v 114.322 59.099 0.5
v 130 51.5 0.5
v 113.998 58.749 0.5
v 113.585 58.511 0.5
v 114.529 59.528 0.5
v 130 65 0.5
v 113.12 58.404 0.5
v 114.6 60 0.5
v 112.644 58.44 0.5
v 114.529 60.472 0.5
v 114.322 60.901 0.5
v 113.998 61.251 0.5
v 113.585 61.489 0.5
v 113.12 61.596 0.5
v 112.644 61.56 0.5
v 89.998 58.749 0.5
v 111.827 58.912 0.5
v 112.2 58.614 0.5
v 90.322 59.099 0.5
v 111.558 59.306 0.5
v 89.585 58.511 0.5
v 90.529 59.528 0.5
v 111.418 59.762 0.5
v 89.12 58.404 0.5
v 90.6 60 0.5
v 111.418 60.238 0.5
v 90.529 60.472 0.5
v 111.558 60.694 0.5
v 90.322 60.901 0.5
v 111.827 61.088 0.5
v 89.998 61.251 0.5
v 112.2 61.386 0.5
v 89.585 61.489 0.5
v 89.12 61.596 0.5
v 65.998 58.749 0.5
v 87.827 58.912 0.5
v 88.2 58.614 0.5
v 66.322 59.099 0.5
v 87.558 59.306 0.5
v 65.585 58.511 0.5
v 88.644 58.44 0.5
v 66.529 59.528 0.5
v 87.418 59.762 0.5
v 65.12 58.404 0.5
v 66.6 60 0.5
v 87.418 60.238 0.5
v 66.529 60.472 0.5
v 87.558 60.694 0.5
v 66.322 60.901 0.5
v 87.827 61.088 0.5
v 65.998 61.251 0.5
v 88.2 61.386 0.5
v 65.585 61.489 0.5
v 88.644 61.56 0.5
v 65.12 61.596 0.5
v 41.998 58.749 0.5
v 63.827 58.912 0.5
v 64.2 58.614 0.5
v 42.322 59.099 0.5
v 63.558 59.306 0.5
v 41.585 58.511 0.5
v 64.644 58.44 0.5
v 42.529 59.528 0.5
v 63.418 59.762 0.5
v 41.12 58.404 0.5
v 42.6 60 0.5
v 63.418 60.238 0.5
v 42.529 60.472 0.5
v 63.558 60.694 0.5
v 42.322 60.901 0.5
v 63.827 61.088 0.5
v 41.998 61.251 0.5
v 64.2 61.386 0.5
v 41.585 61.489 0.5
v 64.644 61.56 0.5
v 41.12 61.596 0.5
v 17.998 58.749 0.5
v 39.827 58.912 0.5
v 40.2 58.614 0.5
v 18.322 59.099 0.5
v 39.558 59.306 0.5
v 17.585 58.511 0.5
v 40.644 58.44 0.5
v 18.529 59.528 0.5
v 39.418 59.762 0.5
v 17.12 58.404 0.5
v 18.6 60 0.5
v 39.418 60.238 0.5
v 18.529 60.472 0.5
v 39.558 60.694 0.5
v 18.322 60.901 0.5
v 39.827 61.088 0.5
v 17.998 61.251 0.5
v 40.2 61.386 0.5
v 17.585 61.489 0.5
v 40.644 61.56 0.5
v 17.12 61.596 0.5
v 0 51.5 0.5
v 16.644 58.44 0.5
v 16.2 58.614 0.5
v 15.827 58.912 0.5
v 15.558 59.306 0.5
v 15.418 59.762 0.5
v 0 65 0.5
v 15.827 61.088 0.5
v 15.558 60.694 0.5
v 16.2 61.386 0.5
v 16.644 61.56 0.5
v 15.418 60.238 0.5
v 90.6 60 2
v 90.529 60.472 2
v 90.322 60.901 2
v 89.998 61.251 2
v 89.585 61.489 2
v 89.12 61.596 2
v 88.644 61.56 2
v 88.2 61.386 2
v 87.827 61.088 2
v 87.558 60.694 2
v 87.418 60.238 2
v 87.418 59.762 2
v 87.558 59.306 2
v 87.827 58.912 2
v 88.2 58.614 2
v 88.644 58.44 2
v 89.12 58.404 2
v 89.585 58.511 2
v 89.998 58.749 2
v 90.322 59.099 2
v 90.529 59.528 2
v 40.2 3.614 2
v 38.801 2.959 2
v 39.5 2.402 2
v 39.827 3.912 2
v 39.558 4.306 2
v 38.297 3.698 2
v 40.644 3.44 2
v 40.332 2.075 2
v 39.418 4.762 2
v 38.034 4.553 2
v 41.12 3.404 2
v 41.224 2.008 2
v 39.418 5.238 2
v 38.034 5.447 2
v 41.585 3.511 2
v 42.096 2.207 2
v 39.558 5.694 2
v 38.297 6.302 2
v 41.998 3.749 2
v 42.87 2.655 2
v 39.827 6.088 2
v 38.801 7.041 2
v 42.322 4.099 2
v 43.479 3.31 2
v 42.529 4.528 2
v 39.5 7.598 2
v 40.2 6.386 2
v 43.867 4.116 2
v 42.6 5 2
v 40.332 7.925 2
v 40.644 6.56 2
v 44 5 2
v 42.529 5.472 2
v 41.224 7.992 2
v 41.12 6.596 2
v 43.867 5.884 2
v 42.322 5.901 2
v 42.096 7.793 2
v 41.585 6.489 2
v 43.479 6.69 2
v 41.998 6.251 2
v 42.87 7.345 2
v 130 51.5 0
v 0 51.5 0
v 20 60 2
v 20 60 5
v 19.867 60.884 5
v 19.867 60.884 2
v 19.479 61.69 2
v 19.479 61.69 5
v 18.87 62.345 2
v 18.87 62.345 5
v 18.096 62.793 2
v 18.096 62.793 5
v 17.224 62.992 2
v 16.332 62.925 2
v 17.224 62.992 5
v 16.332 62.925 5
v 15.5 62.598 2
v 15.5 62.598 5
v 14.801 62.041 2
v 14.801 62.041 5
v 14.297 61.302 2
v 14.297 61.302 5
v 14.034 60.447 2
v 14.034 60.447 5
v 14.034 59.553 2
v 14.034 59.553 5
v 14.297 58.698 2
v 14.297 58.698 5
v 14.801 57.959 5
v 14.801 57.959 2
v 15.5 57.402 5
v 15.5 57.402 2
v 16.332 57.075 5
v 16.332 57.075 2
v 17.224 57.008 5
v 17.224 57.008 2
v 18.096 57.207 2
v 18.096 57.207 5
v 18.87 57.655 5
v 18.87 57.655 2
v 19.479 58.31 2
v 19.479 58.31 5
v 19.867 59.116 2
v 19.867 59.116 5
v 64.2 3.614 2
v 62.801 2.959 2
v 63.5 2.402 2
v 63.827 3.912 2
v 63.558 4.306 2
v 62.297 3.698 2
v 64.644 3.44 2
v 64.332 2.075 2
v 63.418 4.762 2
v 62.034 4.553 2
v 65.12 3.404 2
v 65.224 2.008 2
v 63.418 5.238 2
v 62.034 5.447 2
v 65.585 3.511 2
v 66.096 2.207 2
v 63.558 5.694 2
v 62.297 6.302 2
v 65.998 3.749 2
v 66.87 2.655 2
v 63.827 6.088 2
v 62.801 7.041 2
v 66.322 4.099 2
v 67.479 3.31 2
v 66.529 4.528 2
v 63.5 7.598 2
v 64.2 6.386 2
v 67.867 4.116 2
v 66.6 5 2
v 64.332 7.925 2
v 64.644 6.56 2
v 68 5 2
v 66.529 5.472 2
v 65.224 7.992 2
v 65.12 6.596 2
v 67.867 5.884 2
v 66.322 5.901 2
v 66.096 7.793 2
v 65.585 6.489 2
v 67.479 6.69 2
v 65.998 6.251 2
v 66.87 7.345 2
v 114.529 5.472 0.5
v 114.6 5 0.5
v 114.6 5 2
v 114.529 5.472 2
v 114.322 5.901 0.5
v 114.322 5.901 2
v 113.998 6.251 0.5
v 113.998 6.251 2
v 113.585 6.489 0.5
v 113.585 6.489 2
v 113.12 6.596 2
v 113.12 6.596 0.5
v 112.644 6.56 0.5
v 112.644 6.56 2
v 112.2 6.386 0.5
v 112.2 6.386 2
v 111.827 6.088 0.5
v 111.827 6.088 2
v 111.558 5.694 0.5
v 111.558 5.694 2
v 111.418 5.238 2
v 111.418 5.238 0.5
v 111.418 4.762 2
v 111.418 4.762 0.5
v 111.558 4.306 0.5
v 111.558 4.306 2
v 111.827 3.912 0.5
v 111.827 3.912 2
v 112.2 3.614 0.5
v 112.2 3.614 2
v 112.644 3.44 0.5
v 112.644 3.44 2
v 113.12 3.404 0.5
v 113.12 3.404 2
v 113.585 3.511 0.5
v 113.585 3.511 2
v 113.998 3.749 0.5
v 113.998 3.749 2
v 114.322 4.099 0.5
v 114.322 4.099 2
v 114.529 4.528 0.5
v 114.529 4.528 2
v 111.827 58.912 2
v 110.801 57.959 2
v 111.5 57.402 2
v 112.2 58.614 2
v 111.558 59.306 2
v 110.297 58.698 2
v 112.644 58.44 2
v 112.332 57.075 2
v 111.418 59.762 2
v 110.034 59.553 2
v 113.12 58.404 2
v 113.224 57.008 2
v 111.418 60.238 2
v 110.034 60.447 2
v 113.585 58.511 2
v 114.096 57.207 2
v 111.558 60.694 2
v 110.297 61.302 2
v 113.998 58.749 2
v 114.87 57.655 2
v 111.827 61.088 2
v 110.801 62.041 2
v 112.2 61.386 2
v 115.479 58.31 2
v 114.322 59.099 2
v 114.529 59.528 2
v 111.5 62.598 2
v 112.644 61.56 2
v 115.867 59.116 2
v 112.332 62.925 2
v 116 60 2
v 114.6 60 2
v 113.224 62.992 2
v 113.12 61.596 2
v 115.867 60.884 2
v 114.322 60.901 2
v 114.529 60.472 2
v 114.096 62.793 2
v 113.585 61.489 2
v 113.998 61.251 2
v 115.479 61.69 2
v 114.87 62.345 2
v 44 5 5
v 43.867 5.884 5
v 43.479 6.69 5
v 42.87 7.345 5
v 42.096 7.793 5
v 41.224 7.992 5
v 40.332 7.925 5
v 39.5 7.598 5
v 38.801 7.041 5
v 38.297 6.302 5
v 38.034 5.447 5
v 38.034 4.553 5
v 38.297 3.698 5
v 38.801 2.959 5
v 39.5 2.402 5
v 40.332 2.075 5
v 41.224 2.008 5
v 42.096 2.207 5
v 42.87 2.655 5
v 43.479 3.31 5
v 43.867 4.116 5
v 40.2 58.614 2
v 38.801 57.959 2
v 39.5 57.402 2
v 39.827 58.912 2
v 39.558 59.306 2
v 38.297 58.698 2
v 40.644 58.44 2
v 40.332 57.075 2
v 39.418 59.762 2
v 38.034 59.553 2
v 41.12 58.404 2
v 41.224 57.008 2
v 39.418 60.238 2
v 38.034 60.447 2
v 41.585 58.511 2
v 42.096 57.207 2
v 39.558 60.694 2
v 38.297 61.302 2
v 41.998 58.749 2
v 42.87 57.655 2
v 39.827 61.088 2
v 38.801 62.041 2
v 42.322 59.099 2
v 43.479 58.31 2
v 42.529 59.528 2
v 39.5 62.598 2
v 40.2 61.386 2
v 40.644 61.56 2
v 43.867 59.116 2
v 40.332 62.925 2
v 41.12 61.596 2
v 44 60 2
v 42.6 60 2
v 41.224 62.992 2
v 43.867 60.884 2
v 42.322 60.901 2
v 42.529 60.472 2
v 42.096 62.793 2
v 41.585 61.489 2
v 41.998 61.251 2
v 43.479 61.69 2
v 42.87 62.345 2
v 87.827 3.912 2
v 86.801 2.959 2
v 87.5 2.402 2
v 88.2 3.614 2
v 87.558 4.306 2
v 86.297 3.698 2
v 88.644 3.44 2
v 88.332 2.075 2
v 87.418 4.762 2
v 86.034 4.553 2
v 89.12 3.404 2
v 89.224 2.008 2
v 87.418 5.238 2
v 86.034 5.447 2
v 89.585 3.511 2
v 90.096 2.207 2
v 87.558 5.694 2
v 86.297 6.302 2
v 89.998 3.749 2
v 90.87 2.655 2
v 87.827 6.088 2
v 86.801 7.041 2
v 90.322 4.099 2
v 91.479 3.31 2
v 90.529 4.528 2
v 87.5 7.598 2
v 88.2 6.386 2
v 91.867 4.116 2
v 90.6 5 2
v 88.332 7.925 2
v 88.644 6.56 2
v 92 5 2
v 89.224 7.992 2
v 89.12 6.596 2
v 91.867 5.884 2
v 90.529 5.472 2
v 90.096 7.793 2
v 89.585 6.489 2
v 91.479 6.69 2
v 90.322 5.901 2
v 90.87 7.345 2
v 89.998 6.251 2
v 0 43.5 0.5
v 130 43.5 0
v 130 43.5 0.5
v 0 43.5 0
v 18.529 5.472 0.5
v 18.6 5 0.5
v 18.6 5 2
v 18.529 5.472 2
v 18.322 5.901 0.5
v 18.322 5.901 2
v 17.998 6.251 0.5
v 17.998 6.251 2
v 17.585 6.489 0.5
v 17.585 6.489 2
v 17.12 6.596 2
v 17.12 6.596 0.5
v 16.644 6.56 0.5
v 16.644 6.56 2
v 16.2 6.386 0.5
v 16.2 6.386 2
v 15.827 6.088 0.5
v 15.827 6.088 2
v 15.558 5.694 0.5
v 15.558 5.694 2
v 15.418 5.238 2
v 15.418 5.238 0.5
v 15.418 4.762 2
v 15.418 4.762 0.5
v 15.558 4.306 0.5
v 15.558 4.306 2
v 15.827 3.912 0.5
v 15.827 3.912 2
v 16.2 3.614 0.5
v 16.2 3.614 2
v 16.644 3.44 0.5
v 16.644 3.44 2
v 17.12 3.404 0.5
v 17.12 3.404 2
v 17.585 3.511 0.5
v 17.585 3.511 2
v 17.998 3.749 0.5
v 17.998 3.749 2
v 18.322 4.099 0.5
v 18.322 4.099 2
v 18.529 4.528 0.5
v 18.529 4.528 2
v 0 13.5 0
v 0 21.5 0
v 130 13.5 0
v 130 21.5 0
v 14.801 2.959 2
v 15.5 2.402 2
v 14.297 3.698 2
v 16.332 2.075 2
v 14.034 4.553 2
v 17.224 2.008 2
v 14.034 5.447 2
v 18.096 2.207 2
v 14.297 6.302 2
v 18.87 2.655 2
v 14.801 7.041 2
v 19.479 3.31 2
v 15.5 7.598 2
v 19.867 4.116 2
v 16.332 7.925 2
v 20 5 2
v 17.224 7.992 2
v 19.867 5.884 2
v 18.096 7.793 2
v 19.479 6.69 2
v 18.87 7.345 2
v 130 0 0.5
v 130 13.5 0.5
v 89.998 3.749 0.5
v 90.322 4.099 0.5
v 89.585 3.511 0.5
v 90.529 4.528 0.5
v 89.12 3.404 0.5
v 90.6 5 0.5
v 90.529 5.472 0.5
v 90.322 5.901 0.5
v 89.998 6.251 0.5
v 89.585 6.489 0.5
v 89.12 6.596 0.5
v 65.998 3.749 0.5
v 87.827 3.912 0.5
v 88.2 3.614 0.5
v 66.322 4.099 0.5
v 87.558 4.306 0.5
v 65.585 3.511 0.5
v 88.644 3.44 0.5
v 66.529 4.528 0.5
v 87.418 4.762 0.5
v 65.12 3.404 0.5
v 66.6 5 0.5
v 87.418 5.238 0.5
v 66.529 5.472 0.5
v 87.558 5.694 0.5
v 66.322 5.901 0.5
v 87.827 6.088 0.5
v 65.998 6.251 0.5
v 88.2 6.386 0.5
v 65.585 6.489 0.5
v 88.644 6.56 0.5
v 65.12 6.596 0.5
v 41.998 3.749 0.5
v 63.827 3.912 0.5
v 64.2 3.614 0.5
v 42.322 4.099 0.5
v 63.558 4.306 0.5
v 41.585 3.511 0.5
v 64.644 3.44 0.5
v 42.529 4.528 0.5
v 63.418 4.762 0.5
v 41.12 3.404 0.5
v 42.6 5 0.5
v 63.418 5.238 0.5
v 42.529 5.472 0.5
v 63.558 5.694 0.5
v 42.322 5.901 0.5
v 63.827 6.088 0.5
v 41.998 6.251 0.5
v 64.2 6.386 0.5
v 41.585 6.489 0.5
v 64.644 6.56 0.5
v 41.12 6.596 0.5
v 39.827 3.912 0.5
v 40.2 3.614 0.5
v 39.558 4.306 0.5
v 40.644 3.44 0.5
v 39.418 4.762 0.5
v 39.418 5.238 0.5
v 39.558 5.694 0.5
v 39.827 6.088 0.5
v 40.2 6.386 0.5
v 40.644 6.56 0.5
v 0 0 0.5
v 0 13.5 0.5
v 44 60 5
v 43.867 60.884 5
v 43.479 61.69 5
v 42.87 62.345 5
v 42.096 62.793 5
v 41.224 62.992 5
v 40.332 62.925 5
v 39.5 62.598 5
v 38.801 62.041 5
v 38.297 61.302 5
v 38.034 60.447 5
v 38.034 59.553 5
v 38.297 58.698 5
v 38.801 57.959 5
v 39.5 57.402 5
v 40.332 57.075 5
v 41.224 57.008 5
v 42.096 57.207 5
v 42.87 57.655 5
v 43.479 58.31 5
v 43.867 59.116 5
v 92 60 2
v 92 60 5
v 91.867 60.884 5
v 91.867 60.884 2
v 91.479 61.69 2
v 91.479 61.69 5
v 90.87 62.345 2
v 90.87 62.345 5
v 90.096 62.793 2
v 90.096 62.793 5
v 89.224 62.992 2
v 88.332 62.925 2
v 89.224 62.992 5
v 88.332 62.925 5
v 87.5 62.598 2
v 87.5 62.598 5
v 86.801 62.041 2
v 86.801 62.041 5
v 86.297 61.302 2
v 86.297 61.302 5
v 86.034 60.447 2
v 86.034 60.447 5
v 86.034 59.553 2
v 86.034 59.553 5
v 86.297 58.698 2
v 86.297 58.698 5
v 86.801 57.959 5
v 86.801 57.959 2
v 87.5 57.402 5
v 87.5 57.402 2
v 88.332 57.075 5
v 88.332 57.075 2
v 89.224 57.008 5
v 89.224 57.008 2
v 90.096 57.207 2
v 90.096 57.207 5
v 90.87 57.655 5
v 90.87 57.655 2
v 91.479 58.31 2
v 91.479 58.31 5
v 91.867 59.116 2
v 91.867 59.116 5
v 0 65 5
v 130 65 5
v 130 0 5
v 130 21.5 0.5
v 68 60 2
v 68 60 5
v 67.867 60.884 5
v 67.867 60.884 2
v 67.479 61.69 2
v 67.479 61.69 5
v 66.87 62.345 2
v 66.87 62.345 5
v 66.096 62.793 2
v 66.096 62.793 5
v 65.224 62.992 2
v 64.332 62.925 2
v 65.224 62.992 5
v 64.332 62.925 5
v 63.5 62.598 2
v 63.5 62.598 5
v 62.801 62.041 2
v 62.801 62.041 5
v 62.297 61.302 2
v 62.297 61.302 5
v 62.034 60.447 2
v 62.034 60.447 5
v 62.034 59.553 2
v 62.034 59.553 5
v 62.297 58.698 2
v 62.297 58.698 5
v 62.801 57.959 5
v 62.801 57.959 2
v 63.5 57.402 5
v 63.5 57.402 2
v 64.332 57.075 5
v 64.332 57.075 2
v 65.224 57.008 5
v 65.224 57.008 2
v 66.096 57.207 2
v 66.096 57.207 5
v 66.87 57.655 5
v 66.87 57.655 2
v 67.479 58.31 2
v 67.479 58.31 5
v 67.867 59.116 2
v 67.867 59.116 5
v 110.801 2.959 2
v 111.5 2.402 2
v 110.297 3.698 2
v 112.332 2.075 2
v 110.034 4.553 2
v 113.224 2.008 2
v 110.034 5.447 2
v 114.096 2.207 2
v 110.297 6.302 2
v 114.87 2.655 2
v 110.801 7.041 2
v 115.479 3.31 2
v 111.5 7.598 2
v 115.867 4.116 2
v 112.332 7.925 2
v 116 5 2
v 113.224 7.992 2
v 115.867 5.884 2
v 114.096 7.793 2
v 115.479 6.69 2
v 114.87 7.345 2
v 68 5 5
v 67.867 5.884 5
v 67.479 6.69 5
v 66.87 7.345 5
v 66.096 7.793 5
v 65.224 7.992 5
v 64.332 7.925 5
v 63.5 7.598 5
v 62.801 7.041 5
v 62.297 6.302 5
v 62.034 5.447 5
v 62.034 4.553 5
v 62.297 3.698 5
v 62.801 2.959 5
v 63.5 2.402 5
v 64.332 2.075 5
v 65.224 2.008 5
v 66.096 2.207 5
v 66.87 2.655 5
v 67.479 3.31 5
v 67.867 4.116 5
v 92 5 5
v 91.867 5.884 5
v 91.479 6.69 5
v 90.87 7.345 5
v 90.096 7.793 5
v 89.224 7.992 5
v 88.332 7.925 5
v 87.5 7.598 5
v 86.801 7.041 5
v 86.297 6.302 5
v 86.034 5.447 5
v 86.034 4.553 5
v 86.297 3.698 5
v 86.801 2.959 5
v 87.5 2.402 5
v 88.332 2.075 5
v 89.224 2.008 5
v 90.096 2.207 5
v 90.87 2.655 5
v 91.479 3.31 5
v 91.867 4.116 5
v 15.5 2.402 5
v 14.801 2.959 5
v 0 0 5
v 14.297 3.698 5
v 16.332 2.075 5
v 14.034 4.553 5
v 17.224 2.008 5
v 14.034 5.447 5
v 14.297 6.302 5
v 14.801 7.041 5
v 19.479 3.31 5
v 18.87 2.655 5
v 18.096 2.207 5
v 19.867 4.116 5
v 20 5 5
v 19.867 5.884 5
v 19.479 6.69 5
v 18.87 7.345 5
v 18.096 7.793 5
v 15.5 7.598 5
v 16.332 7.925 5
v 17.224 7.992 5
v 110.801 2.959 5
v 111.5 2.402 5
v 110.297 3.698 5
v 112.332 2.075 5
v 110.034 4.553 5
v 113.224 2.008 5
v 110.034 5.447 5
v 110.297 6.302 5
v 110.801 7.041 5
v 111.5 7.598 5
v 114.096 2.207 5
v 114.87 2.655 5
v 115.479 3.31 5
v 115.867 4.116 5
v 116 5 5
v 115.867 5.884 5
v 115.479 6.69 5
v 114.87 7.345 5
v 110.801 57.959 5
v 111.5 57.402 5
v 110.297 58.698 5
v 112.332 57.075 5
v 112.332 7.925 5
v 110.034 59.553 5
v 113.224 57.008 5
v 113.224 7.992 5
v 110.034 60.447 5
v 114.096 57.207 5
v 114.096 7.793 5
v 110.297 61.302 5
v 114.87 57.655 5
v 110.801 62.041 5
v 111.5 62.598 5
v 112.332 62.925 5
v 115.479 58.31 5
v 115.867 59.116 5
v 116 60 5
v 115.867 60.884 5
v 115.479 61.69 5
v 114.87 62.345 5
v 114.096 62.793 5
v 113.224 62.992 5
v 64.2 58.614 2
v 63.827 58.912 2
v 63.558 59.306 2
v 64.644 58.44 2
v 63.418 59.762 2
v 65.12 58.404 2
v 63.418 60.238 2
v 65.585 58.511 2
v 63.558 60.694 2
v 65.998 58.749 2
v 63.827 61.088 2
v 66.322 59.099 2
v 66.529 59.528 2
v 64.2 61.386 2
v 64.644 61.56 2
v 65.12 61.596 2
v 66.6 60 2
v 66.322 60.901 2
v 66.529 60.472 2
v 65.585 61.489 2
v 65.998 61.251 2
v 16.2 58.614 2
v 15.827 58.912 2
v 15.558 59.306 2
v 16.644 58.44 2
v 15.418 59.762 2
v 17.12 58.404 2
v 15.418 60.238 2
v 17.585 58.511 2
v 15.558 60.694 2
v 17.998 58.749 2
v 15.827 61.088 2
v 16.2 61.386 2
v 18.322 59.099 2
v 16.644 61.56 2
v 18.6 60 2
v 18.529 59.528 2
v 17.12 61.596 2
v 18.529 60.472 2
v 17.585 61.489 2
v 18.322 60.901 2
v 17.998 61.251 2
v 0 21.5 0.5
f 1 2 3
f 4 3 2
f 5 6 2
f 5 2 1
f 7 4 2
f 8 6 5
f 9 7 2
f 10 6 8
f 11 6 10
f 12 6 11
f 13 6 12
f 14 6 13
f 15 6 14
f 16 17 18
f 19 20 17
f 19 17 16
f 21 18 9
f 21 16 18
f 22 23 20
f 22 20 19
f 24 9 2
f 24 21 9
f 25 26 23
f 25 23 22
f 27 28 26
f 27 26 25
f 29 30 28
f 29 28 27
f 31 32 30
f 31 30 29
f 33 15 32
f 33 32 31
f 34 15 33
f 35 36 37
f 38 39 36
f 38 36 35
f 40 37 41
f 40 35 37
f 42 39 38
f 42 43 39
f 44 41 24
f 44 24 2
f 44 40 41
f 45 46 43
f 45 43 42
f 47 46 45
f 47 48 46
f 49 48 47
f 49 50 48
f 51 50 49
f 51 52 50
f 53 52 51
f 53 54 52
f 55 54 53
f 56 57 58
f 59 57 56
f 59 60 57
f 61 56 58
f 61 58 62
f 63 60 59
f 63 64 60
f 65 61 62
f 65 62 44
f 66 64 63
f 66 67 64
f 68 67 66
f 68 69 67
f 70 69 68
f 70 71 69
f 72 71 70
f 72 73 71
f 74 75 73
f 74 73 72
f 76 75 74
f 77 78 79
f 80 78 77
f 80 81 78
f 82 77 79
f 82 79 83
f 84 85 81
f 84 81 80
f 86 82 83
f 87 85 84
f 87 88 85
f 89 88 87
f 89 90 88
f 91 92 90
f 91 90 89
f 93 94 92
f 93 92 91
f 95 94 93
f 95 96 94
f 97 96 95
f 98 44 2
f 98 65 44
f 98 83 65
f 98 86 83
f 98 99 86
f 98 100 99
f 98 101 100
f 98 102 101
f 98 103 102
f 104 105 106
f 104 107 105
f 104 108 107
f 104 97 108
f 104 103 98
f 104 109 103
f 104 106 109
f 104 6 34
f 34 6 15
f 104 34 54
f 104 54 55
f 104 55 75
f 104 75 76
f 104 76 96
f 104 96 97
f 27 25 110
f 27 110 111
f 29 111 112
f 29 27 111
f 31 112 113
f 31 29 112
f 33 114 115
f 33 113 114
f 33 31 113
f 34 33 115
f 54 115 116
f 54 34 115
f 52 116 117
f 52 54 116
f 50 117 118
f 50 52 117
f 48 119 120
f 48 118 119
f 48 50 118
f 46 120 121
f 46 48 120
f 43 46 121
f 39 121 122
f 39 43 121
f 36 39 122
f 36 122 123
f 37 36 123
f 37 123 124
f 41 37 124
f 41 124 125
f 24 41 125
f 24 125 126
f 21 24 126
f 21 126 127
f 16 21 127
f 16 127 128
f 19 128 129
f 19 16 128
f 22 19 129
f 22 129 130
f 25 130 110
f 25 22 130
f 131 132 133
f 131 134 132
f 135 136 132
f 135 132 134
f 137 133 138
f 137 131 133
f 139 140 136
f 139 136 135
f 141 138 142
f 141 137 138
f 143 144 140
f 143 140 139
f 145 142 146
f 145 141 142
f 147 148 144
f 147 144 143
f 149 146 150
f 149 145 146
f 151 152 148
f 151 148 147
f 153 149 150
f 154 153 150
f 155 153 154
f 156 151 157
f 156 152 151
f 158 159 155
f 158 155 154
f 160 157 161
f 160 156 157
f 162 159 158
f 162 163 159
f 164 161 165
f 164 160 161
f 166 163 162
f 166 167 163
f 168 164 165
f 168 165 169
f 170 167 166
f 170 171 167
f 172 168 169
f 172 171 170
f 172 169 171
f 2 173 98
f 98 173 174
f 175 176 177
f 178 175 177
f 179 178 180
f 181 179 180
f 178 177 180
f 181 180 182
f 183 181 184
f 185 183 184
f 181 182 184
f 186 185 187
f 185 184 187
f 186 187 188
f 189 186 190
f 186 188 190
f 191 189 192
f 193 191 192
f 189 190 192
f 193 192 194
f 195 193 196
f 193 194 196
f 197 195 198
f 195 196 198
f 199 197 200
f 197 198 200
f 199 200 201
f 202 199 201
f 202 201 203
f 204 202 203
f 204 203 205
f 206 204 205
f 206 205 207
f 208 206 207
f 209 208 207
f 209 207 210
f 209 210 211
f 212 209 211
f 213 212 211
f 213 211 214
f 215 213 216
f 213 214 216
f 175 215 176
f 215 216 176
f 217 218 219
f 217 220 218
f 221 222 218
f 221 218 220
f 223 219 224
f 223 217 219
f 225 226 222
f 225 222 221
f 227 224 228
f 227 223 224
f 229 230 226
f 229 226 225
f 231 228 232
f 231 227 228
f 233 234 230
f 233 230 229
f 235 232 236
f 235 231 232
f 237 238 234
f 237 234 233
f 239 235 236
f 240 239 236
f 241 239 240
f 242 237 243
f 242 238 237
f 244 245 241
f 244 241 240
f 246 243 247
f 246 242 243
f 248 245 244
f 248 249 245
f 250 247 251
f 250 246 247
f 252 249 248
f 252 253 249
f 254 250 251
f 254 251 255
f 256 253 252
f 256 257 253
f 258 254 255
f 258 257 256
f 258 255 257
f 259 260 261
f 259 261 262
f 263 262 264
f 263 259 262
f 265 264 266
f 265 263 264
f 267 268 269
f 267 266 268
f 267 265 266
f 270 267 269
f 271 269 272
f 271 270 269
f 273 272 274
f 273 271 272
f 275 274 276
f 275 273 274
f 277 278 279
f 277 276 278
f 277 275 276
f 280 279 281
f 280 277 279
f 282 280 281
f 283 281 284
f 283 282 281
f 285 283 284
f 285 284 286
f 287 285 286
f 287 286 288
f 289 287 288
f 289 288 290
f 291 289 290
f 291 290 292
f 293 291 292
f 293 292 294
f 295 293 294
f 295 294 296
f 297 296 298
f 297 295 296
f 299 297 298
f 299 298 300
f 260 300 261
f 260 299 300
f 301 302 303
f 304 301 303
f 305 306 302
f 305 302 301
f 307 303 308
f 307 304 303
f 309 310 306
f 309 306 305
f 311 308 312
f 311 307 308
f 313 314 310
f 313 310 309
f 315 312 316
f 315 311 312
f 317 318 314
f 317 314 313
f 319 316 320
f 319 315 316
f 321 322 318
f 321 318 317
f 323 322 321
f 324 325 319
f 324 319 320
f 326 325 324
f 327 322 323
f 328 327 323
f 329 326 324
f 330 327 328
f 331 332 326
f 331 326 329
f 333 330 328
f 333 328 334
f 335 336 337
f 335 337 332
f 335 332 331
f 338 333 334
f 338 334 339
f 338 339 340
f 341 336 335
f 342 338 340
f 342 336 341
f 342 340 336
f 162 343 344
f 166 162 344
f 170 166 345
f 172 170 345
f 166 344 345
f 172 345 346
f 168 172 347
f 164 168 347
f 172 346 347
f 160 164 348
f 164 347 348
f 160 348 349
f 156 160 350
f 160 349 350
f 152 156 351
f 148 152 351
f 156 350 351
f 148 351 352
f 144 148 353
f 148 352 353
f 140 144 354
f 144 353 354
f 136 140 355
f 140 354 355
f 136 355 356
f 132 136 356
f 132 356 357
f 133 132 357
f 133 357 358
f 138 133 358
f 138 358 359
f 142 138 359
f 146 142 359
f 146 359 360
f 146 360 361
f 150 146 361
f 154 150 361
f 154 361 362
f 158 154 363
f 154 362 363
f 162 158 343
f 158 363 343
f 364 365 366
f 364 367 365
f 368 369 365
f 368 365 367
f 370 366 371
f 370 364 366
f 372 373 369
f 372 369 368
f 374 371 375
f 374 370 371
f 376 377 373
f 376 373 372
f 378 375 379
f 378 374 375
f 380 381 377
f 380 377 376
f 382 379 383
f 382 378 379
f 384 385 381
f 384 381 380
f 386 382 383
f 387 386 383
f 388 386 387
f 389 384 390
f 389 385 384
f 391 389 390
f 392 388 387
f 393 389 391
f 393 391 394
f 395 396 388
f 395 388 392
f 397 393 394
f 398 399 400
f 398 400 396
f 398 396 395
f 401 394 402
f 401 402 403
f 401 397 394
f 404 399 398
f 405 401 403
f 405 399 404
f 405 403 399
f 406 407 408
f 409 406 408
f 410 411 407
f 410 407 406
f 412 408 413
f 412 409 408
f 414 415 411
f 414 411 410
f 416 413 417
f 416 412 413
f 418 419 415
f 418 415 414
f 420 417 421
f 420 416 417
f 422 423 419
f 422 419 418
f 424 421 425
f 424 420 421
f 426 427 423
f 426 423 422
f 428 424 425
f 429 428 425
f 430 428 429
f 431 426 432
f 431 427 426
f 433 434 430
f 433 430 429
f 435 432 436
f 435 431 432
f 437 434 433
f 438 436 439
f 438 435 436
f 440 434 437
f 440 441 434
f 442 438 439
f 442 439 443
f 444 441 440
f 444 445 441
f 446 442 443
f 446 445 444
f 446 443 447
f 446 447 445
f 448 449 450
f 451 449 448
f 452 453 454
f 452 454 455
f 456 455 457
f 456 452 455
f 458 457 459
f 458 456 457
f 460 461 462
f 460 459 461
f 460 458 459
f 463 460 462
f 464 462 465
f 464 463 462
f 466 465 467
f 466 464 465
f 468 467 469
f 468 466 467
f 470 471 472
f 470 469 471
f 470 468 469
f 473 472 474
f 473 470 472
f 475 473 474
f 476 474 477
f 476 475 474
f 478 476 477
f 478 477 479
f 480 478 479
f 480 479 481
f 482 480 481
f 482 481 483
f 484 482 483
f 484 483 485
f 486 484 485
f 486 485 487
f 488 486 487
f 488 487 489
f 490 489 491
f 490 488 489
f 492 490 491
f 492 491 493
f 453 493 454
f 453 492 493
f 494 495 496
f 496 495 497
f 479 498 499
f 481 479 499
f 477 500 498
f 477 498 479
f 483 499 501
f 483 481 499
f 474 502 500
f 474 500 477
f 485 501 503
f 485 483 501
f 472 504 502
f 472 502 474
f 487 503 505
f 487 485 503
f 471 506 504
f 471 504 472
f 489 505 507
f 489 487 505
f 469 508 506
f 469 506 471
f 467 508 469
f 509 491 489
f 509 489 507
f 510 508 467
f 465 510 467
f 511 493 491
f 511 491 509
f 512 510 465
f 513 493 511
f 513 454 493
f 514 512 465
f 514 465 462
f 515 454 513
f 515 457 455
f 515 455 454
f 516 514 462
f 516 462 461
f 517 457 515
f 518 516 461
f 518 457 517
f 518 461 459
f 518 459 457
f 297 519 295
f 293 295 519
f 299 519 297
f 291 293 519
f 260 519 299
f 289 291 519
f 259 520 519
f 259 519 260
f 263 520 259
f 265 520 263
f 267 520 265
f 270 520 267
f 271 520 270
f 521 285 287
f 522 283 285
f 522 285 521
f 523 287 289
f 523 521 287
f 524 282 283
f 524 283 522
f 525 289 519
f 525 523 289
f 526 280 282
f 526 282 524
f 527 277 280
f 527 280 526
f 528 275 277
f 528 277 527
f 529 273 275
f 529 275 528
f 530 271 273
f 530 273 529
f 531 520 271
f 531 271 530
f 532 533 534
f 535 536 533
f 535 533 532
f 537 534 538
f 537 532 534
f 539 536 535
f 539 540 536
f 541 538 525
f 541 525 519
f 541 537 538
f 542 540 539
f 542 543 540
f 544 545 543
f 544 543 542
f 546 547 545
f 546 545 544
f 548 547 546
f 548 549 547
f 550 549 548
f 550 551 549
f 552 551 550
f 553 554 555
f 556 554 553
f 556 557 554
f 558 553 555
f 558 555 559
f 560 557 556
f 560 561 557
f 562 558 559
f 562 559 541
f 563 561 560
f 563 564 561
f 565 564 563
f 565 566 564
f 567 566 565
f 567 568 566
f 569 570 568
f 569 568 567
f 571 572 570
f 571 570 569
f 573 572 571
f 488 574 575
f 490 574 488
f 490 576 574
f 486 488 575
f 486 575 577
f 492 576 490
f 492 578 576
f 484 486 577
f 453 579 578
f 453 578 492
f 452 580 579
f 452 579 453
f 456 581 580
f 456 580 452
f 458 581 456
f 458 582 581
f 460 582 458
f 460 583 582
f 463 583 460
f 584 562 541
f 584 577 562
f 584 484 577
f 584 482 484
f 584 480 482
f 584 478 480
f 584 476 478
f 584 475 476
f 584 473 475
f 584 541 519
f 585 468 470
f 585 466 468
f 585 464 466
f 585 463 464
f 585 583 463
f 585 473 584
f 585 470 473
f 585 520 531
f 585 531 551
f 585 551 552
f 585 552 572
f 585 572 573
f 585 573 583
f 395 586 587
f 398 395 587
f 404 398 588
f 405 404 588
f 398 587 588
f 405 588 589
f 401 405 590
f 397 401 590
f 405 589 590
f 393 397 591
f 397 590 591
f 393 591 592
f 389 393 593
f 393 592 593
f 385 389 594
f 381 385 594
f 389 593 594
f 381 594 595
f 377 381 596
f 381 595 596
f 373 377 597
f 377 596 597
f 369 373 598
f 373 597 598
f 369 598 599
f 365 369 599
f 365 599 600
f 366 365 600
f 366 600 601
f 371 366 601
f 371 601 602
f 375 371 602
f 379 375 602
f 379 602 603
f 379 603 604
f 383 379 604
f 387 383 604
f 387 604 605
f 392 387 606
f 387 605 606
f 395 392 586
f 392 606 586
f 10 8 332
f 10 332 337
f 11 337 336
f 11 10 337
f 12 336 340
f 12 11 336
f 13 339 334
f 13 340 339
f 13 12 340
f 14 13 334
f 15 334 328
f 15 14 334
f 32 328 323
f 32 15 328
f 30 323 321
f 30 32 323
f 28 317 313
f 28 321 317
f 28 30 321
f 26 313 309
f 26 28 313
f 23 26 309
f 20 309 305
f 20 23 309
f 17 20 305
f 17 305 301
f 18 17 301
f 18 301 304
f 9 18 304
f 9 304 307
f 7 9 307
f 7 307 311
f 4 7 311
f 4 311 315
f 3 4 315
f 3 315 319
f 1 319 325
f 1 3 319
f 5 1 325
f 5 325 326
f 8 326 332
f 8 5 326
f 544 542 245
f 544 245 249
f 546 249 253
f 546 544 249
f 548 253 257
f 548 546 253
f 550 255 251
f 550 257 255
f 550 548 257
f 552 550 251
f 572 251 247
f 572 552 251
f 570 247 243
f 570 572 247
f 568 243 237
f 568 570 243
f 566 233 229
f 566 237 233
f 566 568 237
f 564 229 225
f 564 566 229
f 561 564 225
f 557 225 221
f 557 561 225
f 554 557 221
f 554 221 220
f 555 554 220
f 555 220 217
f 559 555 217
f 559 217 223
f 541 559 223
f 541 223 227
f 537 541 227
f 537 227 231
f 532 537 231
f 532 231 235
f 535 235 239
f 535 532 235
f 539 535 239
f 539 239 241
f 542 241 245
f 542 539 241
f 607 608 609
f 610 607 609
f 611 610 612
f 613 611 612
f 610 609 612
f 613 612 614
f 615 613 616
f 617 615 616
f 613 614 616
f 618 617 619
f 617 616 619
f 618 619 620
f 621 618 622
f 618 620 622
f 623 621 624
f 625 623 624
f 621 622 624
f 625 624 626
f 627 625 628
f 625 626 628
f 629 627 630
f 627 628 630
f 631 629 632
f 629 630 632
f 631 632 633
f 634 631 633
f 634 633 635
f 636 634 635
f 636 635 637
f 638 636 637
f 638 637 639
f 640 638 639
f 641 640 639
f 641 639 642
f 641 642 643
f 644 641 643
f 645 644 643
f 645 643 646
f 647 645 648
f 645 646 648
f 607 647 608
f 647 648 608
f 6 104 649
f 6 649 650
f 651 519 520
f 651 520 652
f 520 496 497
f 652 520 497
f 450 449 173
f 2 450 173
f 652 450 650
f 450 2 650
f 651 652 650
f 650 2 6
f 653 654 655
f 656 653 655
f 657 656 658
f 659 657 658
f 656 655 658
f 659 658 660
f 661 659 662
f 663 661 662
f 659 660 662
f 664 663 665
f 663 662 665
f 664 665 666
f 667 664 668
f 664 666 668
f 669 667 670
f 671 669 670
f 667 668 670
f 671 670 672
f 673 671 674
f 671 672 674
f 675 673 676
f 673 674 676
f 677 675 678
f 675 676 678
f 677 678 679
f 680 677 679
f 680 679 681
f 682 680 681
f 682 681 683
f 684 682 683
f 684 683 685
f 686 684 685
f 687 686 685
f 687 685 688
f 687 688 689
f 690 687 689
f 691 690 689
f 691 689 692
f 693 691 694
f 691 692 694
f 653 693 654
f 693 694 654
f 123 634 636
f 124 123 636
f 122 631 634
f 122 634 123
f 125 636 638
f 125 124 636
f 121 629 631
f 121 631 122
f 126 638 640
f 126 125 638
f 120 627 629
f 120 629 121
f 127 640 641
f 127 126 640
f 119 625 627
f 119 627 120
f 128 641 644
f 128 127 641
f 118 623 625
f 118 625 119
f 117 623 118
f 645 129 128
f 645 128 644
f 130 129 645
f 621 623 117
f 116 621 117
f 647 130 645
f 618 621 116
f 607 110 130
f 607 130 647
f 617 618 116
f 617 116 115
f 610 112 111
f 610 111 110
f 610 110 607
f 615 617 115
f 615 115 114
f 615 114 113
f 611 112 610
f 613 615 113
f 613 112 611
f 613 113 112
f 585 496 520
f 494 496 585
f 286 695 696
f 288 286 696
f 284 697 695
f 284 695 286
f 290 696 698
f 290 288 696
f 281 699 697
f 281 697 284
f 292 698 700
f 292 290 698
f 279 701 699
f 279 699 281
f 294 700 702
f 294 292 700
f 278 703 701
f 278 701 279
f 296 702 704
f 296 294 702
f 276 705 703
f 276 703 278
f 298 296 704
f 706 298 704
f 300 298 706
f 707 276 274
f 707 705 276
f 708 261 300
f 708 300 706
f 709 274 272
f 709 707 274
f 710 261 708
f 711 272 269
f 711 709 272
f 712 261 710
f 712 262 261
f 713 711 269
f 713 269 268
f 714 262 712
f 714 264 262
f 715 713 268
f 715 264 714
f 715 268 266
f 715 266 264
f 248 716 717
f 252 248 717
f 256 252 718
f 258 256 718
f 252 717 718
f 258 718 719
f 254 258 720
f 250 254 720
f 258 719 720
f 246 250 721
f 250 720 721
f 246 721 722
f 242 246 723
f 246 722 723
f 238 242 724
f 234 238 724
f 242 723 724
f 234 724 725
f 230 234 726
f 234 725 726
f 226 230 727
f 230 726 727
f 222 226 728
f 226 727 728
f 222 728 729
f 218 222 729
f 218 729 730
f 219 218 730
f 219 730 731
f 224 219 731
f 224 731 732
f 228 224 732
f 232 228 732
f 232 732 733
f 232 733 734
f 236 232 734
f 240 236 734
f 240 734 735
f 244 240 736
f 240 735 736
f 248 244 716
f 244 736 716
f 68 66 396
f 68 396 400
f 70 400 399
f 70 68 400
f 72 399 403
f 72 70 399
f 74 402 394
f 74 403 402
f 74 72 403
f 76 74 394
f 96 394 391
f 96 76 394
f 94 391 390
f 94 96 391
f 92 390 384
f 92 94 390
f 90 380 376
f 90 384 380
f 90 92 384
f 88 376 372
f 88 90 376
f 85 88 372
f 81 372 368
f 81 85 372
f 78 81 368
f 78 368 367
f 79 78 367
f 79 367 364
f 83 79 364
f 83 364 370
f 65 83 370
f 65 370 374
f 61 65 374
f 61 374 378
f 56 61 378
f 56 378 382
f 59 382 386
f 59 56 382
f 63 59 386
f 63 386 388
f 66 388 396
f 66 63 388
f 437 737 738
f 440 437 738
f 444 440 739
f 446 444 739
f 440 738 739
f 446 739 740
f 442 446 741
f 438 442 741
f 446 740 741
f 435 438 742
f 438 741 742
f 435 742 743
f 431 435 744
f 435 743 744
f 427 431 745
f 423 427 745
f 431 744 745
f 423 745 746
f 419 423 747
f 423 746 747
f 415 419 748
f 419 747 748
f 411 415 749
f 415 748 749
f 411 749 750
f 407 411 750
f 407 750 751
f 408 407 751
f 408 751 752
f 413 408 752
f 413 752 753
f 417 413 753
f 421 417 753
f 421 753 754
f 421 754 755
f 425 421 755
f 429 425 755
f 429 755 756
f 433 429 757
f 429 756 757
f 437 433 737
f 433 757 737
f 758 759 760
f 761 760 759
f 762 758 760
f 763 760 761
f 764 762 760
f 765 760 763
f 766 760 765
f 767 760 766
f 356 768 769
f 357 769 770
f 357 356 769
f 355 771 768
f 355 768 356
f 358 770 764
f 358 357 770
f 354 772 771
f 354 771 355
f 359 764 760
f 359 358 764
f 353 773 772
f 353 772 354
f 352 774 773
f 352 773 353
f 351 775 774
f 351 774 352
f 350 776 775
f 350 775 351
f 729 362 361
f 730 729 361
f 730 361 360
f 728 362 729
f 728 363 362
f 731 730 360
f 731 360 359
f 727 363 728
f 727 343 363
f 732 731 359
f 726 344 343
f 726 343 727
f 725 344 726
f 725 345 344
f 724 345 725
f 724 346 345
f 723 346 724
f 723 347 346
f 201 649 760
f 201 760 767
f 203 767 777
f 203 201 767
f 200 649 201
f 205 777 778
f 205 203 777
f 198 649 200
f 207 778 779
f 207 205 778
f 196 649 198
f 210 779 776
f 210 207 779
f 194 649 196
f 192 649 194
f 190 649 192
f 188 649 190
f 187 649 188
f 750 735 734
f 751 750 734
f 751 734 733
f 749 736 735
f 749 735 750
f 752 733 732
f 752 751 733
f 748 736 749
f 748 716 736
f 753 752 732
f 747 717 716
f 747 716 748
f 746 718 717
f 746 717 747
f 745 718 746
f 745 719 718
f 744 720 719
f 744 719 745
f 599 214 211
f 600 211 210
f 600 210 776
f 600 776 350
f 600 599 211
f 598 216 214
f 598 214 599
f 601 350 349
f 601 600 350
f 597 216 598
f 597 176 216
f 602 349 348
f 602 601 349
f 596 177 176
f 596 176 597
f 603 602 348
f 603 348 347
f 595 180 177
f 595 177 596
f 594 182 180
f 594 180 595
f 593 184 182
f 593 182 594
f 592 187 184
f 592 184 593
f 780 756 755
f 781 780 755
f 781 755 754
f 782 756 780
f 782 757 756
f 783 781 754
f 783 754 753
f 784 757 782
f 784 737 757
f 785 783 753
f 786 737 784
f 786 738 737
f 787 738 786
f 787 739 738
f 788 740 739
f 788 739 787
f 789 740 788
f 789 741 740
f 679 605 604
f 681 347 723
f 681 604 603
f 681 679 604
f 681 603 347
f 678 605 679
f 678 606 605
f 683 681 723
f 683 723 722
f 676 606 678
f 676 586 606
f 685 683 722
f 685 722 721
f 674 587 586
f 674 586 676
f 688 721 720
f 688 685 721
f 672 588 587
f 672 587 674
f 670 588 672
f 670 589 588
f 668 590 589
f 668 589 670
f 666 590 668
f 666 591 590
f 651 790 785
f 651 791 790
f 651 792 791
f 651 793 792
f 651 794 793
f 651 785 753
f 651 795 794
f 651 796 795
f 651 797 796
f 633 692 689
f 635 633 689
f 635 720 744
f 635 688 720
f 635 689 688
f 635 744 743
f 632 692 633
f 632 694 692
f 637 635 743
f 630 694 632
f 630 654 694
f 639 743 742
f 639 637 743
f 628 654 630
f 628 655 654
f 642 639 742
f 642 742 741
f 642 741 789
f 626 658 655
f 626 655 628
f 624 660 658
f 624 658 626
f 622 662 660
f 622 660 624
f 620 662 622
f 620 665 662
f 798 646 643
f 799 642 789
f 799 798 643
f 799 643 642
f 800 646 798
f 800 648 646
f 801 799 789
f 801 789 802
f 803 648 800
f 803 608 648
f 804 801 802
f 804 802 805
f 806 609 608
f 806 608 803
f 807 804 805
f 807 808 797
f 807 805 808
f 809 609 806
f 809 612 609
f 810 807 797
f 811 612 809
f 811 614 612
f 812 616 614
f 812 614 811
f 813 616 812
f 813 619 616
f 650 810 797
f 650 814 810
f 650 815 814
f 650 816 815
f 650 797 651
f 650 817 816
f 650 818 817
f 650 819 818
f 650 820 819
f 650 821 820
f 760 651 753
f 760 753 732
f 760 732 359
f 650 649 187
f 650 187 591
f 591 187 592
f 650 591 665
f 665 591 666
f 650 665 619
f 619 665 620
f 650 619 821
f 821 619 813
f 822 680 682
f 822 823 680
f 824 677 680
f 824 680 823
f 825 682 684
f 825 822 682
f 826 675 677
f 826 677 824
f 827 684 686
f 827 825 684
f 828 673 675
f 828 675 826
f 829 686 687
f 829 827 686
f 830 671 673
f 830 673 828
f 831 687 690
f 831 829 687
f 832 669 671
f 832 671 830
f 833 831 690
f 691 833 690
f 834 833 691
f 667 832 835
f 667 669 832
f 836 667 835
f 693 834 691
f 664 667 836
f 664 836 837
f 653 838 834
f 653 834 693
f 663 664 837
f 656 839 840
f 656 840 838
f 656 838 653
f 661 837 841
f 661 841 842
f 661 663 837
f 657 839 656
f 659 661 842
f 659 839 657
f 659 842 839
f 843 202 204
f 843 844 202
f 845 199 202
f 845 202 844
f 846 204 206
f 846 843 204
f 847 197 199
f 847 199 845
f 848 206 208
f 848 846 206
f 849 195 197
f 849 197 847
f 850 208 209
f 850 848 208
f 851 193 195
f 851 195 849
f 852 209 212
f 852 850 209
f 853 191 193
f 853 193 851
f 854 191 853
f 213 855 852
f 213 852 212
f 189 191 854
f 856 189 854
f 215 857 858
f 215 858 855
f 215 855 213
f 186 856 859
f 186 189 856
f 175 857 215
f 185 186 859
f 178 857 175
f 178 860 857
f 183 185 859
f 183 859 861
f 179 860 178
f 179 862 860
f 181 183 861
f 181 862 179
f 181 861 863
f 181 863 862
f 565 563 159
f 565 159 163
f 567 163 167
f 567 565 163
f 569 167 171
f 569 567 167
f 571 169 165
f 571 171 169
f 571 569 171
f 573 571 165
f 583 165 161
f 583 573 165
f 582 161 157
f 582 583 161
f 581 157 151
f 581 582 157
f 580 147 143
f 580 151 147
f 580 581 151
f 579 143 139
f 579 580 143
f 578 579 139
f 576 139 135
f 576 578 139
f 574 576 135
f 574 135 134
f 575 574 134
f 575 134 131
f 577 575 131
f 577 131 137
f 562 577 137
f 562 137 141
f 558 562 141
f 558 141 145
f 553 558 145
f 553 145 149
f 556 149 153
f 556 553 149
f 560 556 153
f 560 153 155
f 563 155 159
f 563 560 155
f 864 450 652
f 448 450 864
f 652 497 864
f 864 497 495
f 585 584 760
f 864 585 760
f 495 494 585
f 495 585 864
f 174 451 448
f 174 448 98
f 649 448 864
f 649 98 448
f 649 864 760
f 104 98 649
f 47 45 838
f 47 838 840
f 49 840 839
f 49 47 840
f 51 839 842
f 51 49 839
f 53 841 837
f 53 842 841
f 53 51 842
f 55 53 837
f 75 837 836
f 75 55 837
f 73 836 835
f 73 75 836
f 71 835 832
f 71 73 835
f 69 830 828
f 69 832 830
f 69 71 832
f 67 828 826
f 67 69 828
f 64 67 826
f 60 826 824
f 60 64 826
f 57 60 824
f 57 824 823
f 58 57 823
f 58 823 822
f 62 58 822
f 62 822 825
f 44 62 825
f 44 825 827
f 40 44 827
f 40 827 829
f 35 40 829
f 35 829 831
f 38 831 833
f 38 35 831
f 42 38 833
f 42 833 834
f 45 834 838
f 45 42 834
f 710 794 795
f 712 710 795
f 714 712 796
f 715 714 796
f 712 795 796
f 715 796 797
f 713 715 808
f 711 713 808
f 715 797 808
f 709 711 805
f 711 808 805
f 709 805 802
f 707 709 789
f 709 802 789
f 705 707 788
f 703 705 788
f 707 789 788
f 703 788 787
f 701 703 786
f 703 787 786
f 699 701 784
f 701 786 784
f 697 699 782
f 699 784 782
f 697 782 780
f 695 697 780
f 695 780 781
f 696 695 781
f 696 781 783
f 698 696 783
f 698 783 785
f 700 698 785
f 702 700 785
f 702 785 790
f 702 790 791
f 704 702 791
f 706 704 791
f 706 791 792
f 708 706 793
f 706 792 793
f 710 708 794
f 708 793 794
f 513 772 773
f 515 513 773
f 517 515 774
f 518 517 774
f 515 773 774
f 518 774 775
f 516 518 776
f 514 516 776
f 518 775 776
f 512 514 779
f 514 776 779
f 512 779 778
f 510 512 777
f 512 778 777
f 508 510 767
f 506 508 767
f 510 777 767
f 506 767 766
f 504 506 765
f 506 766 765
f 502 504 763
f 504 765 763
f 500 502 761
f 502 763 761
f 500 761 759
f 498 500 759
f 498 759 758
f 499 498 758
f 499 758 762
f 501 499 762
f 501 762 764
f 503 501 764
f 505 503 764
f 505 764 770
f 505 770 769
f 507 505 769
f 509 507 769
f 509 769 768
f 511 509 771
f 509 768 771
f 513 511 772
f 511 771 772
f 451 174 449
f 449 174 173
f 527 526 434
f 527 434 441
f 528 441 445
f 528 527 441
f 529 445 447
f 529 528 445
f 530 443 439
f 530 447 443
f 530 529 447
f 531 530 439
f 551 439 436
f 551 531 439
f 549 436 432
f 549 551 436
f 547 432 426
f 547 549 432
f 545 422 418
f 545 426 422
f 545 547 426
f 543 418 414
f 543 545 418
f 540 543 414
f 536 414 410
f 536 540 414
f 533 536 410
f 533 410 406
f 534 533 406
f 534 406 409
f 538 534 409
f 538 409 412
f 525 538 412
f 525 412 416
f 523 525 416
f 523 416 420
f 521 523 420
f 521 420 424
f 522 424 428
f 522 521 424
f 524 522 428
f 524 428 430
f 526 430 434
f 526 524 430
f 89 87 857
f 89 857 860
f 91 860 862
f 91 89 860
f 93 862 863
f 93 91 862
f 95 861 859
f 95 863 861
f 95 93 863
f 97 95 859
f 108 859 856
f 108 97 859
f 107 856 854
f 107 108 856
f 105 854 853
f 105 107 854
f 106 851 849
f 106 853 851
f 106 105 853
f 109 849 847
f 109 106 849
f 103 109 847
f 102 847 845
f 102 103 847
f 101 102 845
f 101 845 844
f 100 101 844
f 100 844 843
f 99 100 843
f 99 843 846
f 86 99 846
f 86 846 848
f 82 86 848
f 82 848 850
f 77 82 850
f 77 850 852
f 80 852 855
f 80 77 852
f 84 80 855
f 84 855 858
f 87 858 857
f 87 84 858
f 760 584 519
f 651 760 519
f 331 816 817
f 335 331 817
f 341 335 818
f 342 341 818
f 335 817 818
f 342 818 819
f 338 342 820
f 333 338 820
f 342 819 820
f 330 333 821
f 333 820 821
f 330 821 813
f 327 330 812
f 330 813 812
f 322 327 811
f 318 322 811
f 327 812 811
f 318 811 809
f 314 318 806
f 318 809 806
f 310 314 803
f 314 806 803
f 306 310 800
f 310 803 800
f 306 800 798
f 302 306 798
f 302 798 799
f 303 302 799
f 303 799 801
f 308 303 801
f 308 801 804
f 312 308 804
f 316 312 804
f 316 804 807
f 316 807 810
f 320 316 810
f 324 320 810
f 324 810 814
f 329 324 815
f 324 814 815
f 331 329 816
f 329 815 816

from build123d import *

# Parameters (mm, degrees)
ESQUISSE1_W             = 130
ESQUISSE1_H             = 65
ESQUISSE1_R             = 1.6
BOSS_EXTRU_1_DEPTH      = 5
ESQUISSE2_W             = 130
ESQUISSE2_H             = 13.5
ESQUISSE2_H_2           = 22
ENL_V_MAT_EXTRU_1_DEPTH = 0.5
ESQUISSE3_R             = 3
ENL_V_MAT_EXTRU_2_DEPTH = 3


with BuildPart() as part:
    # Esquisse1 → Boss.-Extru.1 (new body)
    with BuildSketch(Plane.XY):
        with Locations((65, 32.5)):
            Rectangle(ESQUISSE1_W, ESQUISSE1_H)
        with Locations((113, 5)):
            Circle(ESQUISSE1_R, mode=Mode.SUBTRACT)
        with Locations((89, 5)):
            Circle(ESQUISSE1_R, mode=Mode.SUBTRACT)
        with Locations((65, 5)):
            Circle(ESQUISSE1_R, mode=Mode.SUBTRACT)
        with Locations((41, 5)):
            Circle(ESQUISSE1_R, mode=Mode.SUBTRACT)
        with Locations((17, 5)):
            Circle(ESQUISSE1_R, mode=Mode.SUBTRACT)
        with Locations((113, 60)):
            Circle(ESQUISSE1_R, mode=Mode.SUBTRACT)
        with Locations((89, 60)):
            Circle(ESQUISSE1_R, mode=Mode.SUBTRACT)
        with Locations((65, 60)):
            Circle(ESQUISSE1_R, mode=Mode.SUBTRACT)
        with Locations((41, 60)):
            Circle(ESQUISSE1_R, mode=Mode.SUBTRACT)
        with Locations((17, 60)):
            Circle(ESQUISSE1_R, mode=Mode.SUBTRACT)
    extrude(amount=BOSS_EXTRU_1_DEPTH)

    # Esquisse2 → Enlèv. mat.-Extru.1 (cut)
    with BuildSketch(Plane(origin=(0, 0, 0), x_dir=(-1, 0, 0), z_dir=(0, 0, -1))):
        with Locations((-65, 58.25)):
            Rectangle(ESQUISSE2_W, ESQUISSE2_H)
        with Locations((-65, 6.75)):
            Rectangle(ESQUISSE2_W, ESQUISSE2_H)
        with Locations((-65, 32.5)):
            Rectangle(ESQUISSE2_W, ESQUISSE2_H_2)
    extrude(amount=-ENL_V_MAT_EXTRU_1_DEPTH, mode=Mode.SUBTRACT)

    # Esquisse3 → Enlèv. mat.-Extru.2 (cut)
    with BuildSketch(Plane.XY.offset(5)):
        with Locations((17, 60)):
            Circle(ESQUISSE3_R)
        with Locations((41, 60)):
            Circle(ESQUISSE3_R)
        with Locations((65, 60)):
            Circle(ESQUISSE3_R)
        with Locations((89, 60)):
            Circle(ESQUISSE3_R)
        with Locations((113, 60)):
            Circle(ESQUISSE3_R)
        with Locations((113, 5)):
            Circle(ESQUISSE3_R)
        with Locations((89, 5)):
            Circle(ESQUISSE3_R)
        with Locations((65, 5)):
            Circle(ESQUISSE3_R)
        with Locations((41, 5)):
            Circle(ESQUISSE3_R)
        with Locations((17, 5)):
            Circle(ESQUISSE3_R)
    extrude(amount=-ENL_V_MAT_EXTRU_2_DEPTH, mode=Mode.SUBTRACT)


solid = part.part
